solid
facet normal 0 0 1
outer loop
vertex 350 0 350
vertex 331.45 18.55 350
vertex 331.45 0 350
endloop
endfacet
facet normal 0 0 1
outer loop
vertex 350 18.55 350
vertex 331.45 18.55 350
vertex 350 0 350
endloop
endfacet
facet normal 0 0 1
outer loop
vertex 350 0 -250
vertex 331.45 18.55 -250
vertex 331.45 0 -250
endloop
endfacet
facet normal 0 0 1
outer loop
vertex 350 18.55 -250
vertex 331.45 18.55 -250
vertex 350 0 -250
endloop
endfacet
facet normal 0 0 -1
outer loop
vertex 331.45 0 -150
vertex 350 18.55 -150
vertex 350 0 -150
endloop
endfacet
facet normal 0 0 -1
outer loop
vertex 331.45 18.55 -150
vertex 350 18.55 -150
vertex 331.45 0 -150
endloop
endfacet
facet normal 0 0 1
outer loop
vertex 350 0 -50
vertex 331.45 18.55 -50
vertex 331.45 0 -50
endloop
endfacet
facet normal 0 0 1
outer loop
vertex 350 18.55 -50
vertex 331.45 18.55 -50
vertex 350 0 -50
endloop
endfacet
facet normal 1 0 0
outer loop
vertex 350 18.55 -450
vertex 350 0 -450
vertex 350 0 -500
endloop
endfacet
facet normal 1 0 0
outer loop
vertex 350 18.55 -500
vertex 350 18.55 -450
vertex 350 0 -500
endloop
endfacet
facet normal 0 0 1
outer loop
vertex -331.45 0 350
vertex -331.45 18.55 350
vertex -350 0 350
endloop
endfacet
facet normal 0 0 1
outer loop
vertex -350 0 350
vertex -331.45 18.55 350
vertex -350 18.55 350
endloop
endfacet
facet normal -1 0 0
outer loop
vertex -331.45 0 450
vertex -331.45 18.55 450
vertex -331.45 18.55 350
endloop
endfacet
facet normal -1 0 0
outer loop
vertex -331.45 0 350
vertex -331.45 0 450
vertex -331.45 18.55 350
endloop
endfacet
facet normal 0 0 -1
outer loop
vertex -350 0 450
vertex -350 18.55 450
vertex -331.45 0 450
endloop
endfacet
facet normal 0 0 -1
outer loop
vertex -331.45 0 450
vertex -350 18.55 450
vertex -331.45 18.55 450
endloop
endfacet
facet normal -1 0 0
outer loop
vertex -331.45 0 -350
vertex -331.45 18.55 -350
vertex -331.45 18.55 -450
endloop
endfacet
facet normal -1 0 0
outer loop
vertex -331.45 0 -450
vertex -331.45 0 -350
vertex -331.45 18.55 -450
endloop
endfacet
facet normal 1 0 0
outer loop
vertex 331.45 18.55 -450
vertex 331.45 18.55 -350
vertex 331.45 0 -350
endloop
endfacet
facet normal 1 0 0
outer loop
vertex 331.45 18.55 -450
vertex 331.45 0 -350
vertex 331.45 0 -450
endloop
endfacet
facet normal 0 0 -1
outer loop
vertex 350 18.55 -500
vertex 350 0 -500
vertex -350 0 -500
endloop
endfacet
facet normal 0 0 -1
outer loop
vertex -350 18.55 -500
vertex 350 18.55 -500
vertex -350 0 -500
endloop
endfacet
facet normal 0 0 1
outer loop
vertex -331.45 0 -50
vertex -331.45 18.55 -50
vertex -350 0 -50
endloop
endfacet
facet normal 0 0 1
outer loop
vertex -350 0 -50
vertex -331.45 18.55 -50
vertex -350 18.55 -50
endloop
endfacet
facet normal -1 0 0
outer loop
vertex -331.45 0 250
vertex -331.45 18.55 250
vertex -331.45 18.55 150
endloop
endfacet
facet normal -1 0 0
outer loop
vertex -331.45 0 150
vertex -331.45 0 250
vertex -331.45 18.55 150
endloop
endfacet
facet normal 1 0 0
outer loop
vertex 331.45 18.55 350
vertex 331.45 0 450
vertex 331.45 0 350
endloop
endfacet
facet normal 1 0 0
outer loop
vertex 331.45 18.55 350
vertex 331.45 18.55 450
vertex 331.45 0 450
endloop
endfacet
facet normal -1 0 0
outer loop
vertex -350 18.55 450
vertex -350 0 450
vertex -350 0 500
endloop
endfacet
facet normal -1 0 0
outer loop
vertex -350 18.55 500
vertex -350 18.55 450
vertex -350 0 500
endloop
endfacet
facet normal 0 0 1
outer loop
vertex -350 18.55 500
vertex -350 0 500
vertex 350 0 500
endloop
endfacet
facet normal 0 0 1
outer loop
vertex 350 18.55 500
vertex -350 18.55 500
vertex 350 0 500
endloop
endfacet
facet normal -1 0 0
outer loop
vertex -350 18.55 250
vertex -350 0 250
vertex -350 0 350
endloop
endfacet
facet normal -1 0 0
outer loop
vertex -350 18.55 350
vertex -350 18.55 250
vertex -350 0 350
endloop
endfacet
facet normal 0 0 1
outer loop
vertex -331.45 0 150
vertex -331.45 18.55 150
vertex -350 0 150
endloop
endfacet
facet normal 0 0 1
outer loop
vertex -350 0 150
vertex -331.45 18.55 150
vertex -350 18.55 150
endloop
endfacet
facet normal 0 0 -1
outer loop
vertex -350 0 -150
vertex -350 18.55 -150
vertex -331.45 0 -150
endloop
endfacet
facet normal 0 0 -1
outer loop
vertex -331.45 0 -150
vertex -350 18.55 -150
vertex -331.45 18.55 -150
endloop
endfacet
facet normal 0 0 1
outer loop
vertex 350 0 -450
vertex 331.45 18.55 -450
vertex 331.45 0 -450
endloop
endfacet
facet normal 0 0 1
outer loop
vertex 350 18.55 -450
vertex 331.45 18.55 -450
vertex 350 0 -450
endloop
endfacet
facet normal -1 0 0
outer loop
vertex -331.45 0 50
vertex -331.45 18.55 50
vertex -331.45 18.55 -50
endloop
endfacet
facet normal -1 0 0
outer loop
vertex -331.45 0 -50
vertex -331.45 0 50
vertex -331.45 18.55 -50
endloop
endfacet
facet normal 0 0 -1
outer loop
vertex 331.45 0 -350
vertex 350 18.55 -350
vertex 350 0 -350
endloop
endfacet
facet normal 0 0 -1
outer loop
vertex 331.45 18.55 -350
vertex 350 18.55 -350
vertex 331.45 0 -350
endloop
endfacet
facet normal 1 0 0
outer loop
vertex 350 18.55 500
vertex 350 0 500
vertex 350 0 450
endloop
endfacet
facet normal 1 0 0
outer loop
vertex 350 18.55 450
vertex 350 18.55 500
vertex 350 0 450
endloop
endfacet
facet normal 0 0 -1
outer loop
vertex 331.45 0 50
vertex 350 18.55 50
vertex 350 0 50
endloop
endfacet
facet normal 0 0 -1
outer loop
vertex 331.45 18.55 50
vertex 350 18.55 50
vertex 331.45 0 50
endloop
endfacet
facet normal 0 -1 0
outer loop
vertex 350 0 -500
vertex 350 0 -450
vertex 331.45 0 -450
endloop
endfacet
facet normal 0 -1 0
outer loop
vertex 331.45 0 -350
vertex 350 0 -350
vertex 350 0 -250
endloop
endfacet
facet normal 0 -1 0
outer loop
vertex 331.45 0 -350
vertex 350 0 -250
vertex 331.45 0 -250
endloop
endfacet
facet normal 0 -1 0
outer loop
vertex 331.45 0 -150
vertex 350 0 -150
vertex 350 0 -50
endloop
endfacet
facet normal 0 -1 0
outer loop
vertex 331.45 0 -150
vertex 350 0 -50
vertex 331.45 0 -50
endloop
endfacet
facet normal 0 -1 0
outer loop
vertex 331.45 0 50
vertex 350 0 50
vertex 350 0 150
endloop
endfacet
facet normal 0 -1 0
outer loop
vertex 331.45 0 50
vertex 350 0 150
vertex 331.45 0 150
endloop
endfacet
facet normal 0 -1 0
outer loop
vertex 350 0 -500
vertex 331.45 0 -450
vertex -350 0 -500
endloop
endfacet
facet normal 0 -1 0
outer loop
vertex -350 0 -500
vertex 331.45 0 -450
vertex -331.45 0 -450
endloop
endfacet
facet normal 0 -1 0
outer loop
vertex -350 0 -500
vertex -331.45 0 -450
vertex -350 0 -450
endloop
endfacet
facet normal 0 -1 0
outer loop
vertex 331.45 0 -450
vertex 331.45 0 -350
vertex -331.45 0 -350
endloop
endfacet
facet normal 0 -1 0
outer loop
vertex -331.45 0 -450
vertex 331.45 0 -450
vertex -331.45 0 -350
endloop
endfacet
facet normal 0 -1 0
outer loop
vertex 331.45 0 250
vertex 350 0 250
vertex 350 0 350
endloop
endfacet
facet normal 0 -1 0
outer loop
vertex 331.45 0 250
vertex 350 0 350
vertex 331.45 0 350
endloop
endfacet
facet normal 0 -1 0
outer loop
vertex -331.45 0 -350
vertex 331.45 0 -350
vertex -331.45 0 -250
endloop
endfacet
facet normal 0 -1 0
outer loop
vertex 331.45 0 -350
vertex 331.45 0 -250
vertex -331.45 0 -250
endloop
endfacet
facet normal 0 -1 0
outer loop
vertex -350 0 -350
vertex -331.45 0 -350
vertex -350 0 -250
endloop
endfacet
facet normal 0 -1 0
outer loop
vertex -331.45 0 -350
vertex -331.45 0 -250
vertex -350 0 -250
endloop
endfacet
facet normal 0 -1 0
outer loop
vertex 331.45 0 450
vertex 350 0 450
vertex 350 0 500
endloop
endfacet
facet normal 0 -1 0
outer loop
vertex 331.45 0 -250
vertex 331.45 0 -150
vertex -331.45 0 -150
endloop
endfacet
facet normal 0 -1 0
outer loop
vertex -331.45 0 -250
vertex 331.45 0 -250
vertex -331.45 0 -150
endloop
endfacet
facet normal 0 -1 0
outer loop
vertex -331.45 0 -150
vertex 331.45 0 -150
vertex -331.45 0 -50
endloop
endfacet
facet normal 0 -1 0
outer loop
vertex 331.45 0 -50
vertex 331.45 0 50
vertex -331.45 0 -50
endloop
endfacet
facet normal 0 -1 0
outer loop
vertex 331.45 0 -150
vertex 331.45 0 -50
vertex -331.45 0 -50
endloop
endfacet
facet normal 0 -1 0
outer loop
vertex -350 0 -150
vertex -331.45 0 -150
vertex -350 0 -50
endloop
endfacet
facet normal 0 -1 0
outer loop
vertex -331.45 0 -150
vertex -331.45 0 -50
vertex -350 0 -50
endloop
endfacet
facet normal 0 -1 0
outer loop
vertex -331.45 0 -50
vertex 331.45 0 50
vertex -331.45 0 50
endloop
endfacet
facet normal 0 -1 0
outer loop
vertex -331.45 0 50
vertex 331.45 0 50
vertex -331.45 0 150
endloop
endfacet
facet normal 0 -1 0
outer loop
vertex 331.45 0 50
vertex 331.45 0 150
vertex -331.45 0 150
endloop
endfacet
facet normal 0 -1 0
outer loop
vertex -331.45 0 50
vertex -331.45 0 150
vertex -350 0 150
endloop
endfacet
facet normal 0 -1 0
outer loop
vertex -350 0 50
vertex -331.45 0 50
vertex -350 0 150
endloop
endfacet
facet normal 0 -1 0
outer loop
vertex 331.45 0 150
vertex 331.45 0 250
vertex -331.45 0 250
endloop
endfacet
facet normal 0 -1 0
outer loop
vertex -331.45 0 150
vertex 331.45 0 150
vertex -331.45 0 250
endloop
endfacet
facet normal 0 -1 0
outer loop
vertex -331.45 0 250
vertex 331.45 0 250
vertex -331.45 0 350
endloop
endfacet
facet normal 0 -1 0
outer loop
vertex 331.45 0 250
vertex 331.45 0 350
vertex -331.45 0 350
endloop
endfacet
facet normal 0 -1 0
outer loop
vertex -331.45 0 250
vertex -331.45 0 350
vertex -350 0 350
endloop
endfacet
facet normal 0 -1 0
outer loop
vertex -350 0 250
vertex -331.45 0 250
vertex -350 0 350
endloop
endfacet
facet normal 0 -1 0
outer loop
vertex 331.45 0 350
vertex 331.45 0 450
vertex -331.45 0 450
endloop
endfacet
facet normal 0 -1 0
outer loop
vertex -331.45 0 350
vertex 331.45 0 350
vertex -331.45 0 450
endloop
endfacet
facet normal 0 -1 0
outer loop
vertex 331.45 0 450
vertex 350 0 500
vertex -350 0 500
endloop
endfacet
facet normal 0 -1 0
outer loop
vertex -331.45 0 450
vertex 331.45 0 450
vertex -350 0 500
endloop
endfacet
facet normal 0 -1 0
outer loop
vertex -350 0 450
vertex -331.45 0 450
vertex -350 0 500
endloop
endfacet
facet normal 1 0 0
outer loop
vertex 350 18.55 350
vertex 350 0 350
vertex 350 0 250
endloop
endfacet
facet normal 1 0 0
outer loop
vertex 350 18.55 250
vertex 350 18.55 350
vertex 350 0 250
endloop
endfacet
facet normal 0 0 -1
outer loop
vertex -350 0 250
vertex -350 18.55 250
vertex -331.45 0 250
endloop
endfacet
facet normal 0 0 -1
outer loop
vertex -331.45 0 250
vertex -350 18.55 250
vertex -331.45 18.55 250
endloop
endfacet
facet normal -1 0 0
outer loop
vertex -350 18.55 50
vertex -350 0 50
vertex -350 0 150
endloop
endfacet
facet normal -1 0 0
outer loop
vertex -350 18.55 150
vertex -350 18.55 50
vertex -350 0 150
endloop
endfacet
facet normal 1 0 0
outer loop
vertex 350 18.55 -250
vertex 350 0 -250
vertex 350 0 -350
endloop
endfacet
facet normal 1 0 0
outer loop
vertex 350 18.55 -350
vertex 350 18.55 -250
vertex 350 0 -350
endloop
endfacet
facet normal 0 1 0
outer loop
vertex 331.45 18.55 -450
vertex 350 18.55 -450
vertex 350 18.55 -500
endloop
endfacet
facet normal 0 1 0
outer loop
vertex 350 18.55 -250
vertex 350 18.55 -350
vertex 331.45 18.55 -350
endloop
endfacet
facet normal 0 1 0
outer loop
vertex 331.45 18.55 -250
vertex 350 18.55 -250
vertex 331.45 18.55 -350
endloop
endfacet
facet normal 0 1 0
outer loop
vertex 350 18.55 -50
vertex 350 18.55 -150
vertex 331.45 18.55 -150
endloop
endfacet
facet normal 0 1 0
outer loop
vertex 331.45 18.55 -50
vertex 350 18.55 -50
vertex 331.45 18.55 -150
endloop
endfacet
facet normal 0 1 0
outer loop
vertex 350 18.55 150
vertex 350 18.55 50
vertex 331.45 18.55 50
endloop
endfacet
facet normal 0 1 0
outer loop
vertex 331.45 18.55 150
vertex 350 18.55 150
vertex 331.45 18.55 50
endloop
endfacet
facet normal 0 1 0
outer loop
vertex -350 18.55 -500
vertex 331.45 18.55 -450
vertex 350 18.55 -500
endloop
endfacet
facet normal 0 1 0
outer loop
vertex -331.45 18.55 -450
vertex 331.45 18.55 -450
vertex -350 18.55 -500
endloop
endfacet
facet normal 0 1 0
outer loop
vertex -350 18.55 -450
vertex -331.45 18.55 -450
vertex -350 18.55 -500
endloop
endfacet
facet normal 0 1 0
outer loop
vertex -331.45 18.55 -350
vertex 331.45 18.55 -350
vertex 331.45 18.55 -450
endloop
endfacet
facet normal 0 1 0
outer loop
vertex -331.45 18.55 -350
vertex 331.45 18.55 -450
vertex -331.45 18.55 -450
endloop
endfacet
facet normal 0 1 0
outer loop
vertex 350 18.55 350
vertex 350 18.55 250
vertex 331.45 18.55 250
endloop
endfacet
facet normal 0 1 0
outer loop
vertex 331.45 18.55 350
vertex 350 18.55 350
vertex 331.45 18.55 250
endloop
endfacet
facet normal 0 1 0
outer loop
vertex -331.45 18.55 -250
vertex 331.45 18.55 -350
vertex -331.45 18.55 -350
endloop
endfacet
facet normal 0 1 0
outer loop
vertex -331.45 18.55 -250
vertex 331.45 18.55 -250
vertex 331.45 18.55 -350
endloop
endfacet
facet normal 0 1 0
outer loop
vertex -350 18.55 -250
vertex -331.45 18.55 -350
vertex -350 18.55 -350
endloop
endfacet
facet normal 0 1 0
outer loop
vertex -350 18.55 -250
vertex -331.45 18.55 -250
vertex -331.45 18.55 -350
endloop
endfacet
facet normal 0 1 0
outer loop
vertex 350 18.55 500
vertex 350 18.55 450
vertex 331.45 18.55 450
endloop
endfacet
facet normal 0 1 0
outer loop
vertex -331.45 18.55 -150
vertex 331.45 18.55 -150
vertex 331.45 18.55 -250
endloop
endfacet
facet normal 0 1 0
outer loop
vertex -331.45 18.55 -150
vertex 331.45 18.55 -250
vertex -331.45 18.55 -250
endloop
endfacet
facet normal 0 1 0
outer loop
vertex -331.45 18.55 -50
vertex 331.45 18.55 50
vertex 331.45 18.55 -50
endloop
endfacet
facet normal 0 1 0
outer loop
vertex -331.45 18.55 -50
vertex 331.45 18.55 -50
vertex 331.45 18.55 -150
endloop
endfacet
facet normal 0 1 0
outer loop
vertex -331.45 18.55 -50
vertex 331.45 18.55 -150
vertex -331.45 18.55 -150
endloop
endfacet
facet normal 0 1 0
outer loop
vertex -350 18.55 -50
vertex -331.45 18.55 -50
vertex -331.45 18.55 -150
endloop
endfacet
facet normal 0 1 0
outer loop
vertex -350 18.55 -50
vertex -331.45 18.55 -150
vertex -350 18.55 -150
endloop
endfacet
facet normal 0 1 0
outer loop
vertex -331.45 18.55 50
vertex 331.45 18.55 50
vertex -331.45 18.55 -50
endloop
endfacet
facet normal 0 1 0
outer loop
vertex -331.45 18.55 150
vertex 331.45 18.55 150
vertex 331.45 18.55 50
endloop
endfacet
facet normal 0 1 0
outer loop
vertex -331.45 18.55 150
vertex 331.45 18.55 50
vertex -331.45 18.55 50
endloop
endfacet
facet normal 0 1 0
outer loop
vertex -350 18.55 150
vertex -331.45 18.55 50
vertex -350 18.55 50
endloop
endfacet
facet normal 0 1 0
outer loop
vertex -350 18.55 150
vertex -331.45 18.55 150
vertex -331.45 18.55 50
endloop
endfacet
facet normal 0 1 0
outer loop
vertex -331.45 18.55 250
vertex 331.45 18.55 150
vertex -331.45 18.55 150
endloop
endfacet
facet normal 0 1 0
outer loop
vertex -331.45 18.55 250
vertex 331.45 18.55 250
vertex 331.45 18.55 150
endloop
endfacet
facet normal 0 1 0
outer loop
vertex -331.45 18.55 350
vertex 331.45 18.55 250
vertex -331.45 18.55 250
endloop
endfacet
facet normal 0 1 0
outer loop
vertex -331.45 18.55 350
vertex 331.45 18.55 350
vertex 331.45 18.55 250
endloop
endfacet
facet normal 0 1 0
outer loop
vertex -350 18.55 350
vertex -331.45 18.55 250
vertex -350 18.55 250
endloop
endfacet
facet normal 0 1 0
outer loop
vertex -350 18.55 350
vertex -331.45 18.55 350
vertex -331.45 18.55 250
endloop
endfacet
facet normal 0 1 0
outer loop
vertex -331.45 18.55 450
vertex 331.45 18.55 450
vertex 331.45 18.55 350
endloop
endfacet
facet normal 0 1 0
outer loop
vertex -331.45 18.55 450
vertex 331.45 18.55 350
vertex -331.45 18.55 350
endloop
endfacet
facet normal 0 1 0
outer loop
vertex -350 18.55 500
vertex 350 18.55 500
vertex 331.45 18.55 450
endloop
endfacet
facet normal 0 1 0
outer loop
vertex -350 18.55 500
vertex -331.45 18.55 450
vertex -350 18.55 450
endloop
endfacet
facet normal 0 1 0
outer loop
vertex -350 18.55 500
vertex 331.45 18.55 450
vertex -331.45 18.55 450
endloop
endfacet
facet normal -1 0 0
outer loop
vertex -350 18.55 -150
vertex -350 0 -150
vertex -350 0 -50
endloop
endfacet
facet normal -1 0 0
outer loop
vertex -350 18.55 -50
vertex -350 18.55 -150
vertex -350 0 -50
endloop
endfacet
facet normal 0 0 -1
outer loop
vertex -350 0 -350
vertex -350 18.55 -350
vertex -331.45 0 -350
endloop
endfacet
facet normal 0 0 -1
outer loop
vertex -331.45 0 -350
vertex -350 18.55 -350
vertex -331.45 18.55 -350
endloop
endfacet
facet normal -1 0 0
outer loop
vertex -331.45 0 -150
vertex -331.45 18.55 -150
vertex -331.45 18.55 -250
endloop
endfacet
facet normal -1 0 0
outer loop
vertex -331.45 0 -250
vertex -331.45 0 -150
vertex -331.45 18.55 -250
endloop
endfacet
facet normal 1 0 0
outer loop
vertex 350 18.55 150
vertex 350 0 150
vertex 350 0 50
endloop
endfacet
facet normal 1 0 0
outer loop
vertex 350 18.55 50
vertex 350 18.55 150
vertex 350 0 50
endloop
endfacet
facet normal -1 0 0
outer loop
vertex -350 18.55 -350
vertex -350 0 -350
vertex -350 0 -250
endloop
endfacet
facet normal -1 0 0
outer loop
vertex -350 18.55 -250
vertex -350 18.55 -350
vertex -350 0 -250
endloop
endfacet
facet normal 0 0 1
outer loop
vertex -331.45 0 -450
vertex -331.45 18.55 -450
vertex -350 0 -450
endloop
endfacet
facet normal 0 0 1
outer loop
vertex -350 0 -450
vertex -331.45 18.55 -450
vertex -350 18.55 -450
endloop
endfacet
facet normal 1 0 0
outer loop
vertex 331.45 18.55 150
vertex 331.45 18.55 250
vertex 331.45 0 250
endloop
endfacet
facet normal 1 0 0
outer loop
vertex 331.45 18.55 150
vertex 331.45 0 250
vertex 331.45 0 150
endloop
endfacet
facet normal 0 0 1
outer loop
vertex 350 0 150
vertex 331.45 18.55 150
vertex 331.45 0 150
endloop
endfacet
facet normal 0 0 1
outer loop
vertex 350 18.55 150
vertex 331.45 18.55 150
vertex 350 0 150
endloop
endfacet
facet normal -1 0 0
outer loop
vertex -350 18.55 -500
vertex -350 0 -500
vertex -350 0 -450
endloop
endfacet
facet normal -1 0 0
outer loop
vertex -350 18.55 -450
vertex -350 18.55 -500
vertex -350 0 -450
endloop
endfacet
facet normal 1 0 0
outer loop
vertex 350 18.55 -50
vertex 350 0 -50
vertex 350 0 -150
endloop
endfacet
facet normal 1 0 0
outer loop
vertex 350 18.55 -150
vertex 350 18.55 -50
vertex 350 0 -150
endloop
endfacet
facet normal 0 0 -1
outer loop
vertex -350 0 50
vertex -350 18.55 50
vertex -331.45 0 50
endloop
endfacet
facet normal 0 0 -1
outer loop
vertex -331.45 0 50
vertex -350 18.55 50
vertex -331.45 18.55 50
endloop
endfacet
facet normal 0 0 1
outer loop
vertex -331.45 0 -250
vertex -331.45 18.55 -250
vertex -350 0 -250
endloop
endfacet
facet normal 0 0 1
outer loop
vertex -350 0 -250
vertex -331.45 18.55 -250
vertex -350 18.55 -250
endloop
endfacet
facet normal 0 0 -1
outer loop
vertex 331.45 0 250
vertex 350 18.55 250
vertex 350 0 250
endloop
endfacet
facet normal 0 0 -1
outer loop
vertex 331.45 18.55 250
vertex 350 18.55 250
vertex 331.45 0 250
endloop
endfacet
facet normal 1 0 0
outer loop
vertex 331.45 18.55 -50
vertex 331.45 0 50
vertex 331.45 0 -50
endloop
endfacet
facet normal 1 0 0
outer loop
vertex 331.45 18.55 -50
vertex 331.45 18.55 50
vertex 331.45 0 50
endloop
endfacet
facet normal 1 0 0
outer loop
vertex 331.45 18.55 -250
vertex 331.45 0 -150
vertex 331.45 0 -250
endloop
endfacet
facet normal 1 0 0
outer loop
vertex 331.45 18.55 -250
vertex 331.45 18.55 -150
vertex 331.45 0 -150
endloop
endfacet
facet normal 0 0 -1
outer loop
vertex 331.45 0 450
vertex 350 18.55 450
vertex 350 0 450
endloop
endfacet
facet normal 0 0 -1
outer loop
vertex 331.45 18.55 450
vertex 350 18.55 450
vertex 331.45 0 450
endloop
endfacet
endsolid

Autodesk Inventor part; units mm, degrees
ref_plane "YZ Plane" through (0, 0, 0) normal (1, 0, 0) x (0, 1, 0)
ref_plane "XZ Plane" through (0, 0, 0) normal (0, 1, 0) x (-1, 0, 0)
ref_plane "XY Plane" through (0, 0, 0) normal (0, 0, 1) x (1, 0, 0)
sketch "Esquisse1" plane through (0, 0, 0) normal (0, 1, 0) x (-1, 0, 0)
  line L0 (-350, -500) -> (350, -500)
  line L1 (350, -500) -> (350, 500)
  line L2 (350, 500) -> (-350, 500)
  line L3 (-350, 500) -> (-350, -500)
  line L4 (-350, -500) -> (350, 500) construction
  line L5 (350, -500) -> (-350, 500) construction
  point P0 (0, 0)
  dimension "d0" = 1000
  dimension "d1" = 700
extrude "Extrusion1" add sketch "Esquisse1" along normal blind 18.55
sketch "Esquisse2" plane through (0, 18.55, 0) normal (0, 1, 0) x (1, 0, 0)
  line L0 (-350, 500) -> (-350, -500) projected
  line L1 (-350, -450) -> (-331.45, -450)
  line L2 (-331.45, -450) -> (-331.45, -350)
  line L3 (-331.45, -350) -> (-350, -350)
  line L4 (-350, -350) -> (-350, -450)
  line L5 (-350, -250) -> (-331.45, -250)
  line L6 (-331.45, -250) -> (-331.45, -150)
  line L7 (-331.45, -150) -> (-350, -150)
  line L8 (-350, -150) -> (-350, -250)
  line L9 (-350, -50) -> (-331.45, -50)
  line L10 (-331.45, -50) -> (-331.45, 50)
  line L11 (-331.45, 50) -> (-350, 50)
  line L12 (-350, 50) -> (-350, -50)
  line L13 (-350, 150) -> (-331.45, 150)
  line L14 (-331.45, 150) -> (-331.45, 250)
  line L15 (-331.45, 250) -> (-350, 250)
  line L16 (-350, 250) -> (-350, 150)
  line L17 (350, 500) -> (-350, 500) projected
  line L18 (-350, -500) -> (350, -500) projected
  line L19 (0, -500) -> (0, 500) construction
  line L20 (-350, 350) -> (-331.45, 350)
  line L21 (-331.45, 350) -> (-331.45, 450)
  line L22 (-331.45, 450) -> (-350, 450)
  line L23 (-350, 450) -> (-350, 350)
  line L24 (350, -450) -> (331.45, -450)
  line L25 (331.45, -450) -> (331.45, -350)
  line L26 (331.45, -350) -> (350, -350)
  line L27 (350, -350) -> (350, -450)
  line L28 (350, -250) -> (331.45, -250)
  line L29 (331.45, -250) -> (331.45, -150)
  line L30 (331.45, -150) -> (350, -150)
  line L31 (350, -150) -> (350, -250)
  line L32 (350, -50) -> (331.45, -50)
  line L33 (331.45, -50) -> (331.45, 50)
  line L34 (331.45, 50) -> (350, 50)
  line L35 (350, 50) -> (350, -50)
  line L36 (350, 150) -> (331.45, 150)
  line L37 (331.45, 150) -> (331.45, 250)
  line L38 (331.45, 250) -> (350, 250)
  line L39 (350, 250) -> (350, 150)
  line L40 (350, 350) -> (331.45, 350)
  line L41 (331.45, 350) -> (331.45, 450)
  line L42 (331.45, 450) -> (350, 450)
  line L43 (350, 450) -> (350, 350)
  point P0 (0, 0)
  point P1 (-350, -150)
  point P2 (-350, -250)
  point P3 (-350, 250)
  point P4 (-350, 150)
  point P5 (-350, -350)
  dimension "d6" = 18.55
  dimension "d9" = 200
  dimension "d26" = 50
  dimension "d27" = 100
  dimension "d32" = 50
extrude "Extrusion2" cut sketch "Esquisse2" against normal blind 18.55
properties part number "Plate"
